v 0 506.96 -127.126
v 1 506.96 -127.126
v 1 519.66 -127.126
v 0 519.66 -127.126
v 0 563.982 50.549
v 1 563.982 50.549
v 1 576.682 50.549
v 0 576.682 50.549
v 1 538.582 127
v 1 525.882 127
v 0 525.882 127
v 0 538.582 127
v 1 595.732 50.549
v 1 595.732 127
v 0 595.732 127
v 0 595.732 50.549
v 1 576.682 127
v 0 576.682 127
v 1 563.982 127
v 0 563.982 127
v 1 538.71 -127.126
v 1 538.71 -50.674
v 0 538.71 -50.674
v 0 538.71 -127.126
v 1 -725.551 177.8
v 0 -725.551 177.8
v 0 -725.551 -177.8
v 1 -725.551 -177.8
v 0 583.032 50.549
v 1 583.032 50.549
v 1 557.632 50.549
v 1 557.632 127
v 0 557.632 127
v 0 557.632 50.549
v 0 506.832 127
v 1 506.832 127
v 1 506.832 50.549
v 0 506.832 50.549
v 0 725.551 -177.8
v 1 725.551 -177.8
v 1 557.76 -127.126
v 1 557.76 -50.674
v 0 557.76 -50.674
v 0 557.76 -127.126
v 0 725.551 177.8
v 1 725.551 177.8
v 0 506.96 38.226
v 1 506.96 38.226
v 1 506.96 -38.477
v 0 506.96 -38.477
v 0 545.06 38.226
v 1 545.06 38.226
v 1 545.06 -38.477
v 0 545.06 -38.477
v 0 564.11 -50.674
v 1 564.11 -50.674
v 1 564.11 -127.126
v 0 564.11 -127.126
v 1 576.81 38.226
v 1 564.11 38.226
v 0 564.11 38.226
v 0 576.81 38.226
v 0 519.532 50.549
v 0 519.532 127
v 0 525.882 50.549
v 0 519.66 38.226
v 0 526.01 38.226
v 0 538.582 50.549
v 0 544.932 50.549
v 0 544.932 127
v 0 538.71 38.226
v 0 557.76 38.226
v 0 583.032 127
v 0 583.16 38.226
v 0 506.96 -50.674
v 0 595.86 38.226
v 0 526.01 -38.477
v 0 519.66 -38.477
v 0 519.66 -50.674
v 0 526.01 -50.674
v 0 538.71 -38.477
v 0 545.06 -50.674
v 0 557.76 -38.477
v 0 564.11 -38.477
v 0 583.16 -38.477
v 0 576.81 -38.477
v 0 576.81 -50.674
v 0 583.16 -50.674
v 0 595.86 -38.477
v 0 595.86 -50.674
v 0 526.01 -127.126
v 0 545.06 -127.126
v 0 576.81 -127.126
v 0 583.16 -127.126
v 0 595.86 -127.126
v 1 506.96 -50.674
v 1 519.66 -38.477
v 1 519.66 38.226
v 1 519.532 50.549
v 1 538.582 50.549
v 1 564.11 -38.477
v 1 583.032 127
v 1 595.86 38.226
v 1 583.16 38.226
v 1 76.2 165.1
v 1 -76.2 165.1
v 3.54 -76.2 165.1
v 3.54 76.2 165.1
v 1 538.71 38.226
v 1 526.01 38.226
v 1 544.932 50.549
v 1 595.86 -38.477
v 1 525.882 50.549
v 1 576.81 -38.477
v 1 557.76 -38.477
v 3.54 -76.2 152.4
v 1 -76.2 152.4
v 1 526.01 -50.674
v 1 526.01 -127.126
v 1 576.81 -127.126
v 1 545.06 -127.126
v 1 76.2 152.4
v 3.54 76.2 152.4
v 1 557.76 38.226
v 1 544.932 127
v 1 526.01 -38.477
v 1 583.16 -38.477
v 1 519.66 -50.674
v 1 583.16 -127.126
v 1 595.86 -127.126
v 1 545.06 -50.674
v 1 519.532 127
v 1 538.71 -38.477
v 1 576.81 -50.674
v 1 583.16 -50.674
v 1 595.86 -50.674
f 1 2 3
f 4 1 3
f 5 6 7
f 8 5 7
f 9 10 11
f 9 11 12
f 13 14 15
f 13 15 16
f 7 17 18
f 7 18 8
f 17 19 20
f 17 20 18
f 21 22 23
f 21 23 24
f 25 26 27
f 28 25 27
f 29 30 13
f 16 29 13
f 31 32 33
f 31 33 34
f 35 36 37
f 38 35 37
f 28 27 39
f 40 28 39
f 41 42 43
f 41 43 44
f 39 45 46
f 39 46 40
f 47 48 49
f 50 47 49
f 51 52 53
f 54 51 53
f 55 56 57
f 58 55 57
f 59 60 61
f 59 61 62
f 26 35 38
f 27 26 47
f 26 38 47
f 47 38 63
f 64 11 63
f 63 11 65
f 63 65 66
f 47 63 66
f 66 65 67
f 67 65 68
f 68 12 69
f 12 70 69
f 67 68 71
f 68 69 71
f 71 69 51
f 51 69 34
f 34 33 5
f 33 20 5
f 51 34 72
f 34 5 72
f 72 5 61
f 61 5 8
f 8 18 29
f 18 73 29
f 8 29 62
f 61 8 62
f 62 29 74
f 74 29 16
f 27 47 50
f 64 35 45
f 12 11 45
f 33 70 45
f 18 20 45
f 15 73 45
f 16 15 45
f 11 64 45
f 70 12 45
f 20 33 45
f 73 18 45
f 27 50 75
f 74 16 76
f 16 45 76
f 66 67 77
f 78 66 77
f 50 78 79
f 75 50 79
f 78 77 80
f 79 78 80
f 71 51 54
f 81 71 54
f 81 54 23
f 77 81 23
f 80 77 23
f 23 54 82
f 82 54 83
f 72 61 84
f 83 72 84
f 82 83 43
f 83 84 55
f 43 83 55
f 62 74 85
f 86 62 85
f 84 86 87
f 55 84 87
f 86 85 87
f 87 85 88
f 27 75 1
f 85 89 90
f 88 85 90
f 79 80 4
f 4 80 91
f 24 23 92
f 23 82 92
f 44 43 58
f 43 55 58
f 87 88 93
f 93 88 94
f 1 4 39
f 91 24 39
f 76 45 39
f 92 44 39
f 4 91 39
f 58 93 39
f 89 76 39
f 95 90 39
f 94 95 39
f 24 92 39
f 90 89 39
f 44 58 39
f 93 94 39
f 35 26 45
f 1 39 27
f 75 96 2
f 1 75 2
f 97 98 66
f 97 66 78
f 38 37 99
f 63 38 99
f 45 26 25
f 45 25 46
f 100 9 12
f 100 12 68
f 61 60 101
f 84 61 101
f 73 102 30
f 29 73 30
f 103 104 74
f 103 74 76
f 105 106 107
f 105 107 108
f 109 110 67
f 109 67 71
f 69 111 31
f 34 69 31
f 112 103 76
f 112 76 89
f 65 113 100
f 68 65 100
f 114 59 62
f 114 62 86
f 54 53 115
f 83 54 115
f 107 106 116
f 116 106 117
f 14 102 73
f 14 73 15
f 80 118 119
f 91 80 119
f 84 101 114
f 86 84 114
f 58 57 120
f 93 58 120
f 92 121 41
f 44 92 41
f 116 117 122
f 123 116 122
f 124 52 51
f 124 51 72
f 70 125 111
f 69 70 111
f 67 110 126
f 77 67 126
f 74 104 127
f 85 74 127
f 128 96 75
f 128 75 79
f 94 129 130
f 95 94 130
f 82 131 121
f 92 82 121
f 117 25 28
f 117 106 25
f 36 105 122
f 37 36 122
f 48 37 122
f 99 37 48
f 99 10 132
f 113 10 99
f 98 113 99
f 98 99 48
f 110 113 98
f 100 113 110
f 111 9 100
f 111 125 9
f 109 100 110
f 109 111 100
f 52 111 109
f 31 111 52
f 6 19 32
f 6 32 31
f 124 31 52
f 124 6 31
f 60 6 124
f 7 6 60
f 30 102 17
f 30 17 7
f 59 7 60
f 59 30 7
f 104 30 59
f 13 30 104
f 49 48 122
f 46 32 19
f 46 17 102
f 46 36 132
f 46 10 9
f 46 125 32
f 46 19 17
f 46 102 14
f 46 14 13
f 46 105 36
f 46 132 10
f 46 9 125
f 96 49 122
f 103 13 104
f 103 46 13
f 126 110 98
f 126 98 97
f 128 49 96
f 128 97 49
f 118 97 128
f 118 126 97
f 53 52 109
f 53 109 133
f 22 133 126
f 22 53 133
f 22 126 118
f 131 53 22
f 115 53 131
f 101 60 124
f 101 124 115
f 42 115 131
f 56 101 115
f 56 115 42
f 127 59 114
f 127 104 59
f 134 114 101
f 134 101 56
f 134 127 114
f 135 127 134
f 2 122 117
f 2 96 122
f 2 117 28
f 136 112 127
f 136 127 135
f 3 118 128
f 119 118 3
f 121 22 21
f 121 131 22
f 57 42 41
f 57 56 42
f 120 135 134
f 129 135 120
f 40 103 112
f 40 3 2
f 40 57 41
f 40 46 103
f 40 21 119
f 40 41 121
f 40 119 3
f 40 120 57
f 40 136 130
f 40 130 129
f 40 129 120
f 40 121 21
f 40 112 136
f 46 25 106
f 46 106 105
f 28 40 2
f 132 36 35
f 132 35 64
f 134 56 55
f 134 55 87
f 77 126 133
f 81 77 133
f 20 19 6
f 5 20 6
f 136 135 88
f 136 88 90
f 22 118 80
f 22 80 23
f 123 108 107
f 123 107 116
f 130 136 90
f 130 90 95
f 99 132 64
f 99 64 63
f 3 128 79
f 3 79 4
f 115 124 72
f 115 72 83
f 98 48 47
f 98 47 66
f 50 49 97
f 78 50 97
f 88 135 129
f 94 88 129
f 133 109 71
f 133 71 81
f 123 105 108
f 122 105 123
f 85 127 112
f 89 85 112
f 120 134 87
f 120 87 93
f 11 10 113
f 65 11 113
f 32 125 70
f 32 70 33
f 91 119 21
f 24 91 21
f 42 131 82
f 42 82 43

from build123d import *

# Parameters (mm, degrees)
SKETCH1_W           = 355.6
SKETCH1_H           = 1451.102
BOSS_EXTRUDE1_DEPTH = 0.999998
SKETCH2_W           = 76.45119902
SKETCH2_H           = 12.7
SKETCH2_W_2         = 76.70239804
CUT_EXTRUDE1_DEPTH  = 748.019473372
LPATTERN1_COUNT     = 5
LPATTERN1_PITCH     = 19.05
SKETCH3_W           = 12.7
SKETCH3_H           = 152.4
BOSS_EXTRUDE2_DEPTH = 2.54


with BuildPart() as part:
    # Sketch1 → Boss-Extrude1 (new body)
    with BuildSketch(Plane(origin=(0, 0, 0), x_dir=(0, 0, -1), z_dir=(1, 0, 0))):
        Rectangle(SKETCH1_W, SKETCH1_H)
    extrude(amount=BOSS_EXTRUDE1_DEPTH)

    # Sketch2 → Cut-Extrude1 (cut, through all)
    with BuildSketch(Plane(origin=(0.999998, 0, 0), x_dir=(0, 0, -1), z_dir=(1, 0, 0))):
        with Locations((-88.77440049, 589.382053571)):
            Rectangle(SKETCH2_W, SKETCH2_H)
        with Locations((0.12559951, 589.5101875)):
            Rectangle(SKETCH2_W_2, SKETCH2_H)
        with Locations((88.9, 589.5101875)):
            Rectangle(SKETCH2_W, SKETCH2_H)
    cut_extrude1 = extrude(amount=-CUT_EXTRUDE1_DEPTH, mode=Mode.SUBTRACT)

    # LPattern1: Cut-Extrude1 ×5
    with Locations(*[(0, -i * LPATTERN1_PITCH, 0) for i in range(1, LPATTERN1_COUNT)]):
        add(cut_extrude1, mode=Mode.SUBTRACT)

    # Sketch3 → Boss-Extrude2 (add)
    with BuildSketch(Plane(origin=(0.999998, 0, 0), x_dir=(0, 0, -1), z_dir=(1, 0, 0))):
        with Locations((-158.75, 0)):
            Rectangle(SKETCH3_W, SKETCH3_H)
    extrude(amount=BOSS_EXTRUDE2_DEPTH)


solid = part.part
